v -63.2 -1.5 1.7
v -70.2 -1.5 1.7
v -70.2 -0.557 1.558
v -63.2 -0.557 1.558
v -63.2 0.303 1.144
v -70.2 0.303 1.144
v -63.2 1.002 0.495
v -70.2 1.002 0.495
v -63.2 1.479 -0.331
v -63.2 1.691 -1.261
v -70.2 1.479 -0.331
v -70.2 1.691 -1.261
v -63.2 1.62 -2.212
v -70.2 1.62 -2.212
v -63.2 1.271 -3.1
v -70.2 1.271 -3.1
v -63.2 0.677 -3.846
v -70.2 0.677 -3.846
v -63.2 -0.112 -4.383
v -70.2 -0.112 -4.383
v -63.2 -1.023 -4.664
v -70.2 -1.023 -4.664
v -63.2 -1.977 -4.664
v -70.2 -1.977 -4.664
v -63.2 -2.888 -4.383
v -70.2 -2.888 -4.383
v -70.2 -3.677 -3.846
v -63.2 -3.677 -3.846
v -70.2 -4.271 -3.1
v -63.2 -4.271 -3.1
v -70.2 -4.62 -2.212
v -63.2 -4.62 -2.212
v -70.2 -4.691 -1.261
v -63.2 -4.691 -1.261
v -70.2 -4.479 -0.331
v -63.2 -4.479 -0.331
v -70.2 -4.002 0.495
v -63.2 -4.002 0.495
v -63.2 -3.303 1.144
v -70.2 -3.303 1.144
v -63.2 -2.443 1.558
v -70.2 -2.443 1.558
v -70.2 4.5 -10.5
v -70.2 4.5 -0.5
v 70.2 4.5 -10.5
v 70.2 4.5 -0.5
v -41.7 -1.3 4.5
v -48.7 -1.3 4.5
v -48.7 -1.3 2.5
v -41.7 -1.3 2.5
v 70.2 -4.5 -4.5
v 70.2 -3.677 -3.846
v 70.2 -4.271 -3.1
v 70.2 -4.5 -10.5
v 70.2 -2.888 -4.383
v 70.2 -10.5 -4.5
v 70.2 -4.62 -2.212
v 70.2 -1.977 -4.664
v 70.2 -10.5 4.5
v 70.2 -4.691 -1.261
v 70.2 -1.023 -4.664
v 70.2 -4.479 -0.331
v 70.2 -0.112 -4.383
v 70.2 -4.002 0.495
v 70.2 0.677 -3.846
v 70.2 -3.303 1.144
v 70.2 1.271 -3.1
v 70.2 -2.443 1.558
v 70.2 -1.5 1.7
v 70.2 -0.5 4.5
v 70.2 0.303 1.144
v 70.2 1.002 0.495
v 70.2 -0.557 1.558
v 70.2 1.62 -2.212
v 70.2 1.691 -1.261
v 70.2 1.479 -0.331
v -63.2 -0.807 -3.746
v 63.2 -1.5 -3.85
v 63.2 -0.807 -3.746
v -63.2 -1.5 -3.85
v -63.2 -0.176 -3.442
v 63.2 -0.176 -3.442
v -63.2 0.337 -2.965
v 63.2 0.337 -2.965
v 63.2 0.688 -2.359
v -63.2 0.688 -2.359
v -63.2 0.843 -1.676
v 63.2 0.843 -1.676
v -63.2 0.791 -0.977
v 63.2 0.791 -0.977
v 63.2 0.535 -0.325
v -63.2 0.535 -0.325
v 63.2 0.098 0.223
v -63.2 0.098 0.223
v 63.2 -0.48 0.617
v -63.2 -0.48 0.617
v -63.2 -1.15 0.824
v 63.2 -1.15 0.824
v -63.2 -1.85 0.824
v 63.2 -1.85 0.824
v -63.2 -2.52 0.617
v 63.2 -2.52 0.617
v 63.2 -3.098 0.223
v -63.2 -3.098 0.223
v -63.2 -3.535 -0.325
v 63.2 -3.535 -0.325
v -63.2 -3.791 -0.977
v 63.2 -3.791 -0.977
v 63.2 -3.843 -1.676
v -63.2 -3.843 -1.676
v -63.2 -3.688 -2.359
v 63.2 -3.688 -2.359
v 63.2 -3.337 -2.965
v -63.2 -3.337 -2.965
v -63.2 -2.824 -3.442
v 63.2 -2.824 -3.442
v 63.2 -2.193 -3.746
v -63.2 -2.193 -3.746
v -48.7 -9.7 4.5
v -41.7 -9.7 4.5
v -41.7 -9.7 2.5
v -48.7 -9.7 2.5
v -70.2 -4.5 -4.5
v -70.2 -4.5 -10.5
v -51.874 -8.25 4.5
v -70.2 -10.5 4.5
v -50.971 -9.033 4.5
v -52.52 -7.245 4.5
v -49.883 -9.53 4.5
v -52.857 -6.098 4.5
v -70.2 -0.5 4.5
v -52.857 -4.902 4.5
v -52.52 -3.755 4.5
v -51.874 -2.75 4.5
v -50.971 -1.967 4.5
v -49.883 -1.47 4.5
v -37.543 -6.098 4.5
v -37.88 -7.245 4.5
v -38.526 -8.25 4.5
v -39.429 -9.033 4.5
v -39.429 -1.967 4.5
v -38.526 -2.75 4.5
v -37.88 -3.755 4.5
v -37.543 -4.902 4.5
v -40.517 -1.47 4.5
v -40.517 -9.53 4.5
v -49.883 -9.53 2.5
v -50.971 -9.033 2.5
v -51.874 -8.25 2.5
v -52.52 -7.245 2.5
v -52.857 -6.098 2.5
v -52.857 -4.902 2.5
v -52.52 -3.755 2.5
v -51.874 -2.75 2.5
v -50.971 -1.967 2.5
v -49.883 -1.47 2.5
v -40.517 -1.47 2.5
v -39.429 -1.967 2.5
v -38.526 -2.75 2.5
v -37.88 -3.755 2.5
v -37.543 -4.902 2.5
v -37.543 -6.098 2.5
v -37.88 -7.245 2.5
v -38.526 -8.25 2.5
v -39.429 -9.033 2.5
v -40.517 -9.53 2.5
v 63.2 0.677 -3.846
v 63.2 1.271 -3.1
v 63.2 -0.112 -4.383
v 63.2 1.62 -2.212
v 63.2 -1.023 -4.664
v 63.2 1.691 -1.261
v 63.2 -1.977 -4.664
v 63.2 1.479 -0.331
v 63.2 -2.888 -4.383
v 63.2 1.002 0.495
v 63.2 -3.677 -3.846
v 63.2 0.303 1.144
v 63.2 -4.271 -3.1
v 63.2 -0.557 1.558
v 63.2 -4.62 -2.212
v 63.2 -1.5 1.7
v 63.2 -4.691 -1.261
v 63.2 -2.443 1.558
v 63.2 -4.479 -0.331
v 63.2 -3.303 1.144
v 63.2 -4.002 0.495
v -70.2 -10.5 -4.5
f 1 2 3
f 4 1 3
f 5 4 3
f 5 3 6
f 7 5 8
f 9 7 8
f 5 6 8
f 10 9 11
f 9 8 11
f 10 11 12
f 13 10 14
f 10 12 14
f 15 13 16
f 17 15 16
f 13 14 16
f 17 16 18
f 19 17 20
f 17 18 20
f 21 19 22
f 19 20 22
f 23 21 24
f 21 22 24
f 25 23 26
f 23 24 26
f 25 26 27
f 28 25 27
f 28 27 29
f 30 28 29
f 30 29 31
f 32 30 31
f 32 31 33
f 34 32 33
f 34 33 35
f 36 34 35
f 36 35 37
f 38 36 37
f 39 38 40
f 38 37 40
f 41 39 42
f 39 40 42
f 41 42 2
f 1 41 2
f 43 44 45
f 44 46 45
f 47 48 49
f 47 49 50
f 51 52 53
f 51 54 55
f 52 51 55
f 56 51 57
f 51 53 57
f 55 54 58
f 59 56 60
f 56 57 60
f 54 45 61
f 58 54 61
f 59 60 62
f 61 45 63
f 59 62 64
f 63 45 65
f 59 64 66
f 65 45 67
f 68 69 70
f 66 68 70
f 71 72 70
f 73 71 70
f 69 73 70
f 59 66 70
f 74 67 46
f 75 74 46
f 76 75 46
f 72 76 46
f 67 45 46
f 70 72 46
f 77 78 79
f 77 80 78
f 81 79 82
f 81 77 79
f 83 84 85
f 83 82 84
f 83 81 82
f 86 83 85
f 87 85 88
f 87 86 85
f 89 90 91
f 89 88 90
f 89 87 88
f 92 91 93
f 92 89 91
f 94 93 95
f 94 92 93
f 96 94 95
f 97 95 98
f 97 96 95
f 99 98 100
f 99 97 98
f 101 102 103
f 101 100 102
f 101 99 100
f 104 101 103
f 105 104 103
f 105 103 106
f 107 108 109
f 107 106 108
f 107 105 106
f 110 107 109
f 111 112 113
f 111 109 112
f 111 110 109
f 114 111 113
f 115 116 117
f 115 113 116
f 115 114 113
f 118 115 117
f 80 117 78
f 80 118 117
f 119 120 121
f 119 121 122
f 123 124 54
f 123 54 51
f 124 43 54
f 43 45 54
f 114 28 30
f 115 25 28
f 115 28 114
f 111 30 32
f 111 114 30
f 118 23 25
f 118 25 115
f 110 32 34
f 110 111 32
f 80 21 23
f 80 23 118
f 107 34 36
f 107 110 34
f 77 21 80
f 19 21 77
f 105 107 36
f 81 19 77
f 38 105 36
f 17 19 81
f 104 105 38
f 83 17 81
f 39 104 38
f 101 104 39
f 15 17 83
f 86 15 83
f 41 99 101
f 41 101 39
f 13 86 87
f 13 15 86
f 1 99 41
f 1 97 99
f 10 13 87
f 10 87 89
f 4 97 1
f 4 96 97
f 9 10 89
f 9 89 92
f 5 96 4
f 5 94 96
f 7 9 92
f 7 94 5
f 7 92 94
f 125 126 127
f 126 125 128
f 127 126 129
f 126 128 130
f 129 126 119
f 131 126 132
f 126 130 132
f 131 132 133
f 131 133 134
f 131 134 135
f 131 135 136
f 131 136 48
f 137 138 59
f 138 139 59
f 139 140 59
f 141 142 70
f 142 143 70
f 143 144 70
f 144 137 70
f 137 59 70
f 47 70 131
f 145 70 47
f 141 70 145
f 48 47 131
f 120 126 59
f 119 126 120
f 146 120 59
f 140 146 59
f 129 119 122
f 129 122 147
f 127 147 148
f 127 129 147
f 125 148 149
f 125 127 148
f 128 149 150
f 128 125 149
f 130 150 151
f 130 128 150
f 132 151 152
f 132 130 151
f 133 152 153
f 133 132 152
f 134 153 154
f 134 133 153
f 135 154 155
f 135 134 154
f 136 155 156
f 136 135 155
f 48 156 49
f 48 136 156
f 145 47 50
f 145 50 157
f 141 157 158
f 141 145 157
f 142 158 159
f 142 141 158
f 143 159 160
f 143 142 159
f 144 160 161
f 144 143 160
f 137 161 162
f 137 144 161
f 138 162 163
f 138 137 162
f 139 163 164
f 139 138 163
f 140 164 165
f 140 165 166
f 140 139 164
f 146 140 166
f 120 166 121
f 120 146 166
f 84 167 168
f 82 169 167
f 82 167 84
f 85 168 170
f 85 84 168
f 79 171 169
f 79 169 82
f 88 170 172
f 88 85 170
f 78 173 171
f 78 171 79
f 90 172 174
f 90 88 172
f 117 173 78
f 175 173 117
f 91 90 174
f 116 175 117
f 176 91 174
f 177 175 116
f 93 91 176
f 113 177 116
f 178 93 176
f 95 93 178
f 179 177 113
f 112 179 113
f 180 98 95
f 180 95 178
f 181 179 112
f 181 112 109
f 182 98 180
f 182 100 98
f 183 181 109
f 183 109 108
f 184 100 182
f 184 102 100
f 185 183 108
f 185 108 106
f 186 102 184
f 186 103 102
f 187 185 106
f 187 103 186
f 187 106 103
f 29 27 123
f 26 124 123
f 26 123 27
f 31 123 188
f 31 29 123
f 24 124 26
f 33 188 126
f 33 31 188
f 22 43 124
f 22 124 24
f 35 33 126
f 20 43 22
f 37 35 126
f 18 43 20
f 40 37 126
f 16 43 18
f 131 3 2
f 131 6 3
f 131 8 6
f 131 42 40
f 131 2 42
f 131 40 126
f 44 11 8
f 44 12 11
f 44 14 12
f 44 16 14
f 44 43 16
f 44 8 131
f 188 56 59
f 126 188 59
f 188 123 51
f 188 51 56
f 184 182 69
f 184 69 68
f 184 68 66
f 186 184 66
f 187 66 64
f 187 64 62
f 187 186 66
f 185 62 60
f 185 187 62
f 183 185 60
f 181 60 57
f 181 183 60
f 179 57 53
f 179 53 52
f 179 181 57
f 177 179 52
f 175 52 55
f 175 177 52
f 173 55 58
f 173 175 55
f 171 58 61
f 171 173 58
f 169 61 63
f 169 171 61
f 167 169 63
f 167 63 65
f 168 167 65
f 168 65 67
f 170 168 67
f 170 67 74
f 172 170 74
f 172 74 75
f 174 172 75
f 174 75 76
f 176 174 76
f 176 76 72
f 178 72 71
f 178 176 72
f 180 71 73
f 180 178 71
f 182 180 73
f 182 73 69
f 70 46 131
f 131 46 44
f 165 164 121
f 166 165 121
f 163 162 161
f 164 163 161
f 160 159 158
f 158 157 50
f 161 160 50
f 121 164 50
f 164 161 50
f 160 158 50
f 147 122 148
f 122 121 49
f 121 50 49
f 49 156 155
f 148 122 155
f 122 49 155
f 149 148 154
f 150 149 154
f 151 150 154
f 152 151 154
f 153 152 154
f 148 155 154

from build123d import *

# Parameters (mm, degrees)
ESQUISSE3_R             = 2.35
BOSS_EXTRU_2_DEPTH      = 70.2
CHANFREIN1_SIZE         = 5
ESQUISSE6_R             = 3.2
ESQUISSE6_R_2           = 2.35
ENL_V_MAT_EXTRU_1_DEPTH = 7
ENL_V_START             = -7
ESQUISSE7_R             = 3.2
ESQUISSE7_R_2           = 2.35
ENL_V_MAT_EXTRU_2_DEPTH = 7
ENL_V_MAT_EXTRU_4_DEPTH = 2


with BuildPart() as part:
    # Esquisse3 → Boss.-Extru.2 (new, symmetric)
    with BuildSketch(Plane(origin=(0, 0, 0), x_dir=(0, 0, -1), z_dir=(1, 0, 0))):
        Polygon((-4.5, -10.5), (-4.5, 4.5), (10.5, 4.5), (10.5, -4.5), (4.5, -4.5), (4.5, -10.5), align=None)
        with Locations((1.5, -1.5)):
            Circle(ESQUISSE3_R, mode=Mode.SUBTRACT)
    extrude(amount=BOSS_EXTRU_2_DEPTH, both=True)

    # Chanfrein1
    chanfrein1_edges = [part.edges().sort_by_distance(p)[0] for p in [
        (0, 4.5, 4.5),
    ]]
    chamfer(chanfrein1_edges, length=CHANFREIN1_SIZE)

    # Esquisse6 → Enlèv. mat.-Extru.1 (cut)
    with BuildSketch(Plane.ZY.offset(70.2)):
        with Locations((-1.5, -1.5)):
            Circle(ESQUISSE6_R)
        with Locations((-1.5, -1.5)):
            Circle(ESQUISSE6_R_2, mode=Mode.SUBTRACT)
    extrude(amount=-ENL_V_MAT_EXTRU_1_DEPTH, mode=Mode.SUBTRACT)

    # Esquisse7 → Enlèv. mat.-Extru.2 (cut)
    with BuildSketch(Plane(origin=(70.2, 0, 0), x_dir=(0, 0, -1), z_dir=(1, 0, 0)).offset(ENL_V_START)):
        with Locations(Location((1.5, -1.5, 0), (0, 0, 180))):
            Circle(ESQUISSE7_R)
        with Locations(Location((1.5, -1.5, 0), (0, 0, 180))):
            Circle(ESQUISSE7_R_2, mode=Mode.SUBTRACT)
    extrude(amount=ENL_V_MAT_EXTRU_2_DEPTH, mode=Mode.SUBTRACT)

    # Esquisse9 → Enlèv. mat.-Extru.4 (cut)
    with BuildSketch(Plane.XY.offset(4.5)):
        with BuildLine():
            Line((-48.7, -1.3), (-41.7, -1.3))
            ThreePointArc((-41.7, -1.3), (-37.5, -5.5), (-41.7, -9.7))
            Line((-41.7, -9.7), (-48.7, -9.7))
            ThreePointArc((-48.7, -9.7), (-52.9, -5.5), (-48.7, -1.3))
        make_face()
    extrude(amount=-ENL_V_MAT_EXTRU_4_DEPTH, mode=Mode.SUBTRACT)


solid = part.part
